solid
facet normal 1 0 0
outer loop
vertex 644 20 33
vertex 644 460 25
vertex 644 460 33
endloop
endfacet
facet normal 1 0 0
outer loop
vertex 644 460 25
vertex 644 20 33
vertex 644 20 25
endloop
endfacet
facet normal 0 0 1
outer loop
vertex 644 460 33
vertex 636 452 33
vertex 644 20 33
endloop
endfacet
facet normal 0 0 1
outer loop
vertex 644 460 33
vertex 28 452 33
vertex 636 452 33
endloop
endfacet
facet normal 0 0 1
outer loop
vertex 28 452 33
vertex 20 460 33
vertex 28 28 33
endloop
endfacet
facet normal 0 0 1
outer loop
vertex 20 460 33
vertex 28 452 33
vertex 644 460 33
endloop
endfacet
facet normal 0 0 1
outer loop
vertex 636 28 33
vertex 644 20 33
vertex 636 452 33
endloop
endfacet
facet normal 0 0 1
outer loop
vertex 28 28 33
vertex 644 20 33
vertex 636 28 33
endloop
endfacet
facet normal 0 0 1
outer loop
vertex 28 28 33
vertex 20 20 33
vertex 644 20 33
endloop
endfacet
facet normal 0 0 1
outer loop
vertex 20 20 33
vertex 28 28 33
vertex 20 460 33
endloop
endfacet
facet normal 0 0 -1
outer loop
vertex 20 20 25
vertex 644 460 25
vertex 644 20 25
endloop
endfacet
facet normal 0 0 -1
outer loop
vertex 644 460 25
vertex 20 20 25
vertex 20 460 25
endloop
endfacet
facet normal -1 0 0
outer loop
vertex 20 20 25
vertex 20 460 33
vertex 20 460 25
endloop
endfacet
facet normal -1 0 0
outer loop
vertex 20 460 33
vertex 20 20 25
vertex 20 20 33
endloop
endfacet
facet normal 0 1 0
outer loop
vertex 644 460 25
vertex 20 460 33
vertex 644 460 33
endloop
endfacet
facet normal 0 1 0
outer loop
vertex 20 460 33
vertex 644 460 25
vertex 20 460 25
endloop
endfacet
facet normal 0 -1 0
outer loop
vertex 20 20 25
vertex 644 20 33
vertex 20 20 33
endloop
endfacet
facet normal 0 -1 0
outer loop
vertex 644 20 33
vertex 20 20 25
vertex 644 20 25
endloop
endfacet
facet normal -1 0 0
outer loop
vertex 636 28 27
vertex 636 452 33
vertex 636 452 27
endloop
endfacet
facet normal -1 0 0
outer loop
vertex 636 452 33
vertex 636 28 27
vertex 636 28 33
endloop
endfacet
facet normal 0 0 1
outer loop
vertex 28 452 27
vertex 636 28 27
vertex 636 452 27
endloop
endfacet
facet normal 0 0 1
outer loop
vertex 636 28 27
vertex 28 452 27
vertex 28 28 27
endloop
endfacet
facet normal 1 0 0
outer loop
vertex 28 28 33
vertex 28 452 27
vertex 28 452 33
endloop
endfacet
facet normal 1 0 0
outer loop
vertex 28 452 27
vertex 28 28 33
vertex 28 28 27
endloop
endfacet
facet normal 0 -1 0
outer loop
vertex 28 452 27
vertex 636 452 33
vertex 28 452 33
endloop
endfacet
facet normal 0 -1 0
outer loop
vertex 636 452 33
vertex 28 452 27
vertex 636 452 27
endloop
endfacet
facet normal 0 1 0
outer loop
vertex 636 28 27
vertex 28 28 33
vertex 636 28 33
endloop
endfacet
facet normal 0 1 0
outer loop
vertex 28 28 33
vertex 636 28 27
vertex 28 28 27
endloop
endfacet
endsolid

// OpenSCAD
// file: lib/generated_constants.scad
// AUTO-GENERATED from simulation/sizing.py — do not hand edit
P_target_W = 10.0;
A_mem_m2 = 0.72;
active_w = 200.0;
active_h = 300.0;
n_plates = 12;
housing_od = 280.0;
housing_len = 264;
bolt_circle = 240.0;
frame_L = 664;
frame_W = 480.0;
frame_H = 900;
delta_P_bar = 34.58;
plate_pitch = 12;
// main file
include <lib/generated_constants.scad>

module drip_tray() {
  L = frame_L - 40;
  W = frame_W - 40;
  translate([20, 20, 25])
  difference() {
    cube([L, W, 8]);
    translate([8, 8, 2]) cube([L-16, W-16, 10]);
  }
}
drip_tray();
